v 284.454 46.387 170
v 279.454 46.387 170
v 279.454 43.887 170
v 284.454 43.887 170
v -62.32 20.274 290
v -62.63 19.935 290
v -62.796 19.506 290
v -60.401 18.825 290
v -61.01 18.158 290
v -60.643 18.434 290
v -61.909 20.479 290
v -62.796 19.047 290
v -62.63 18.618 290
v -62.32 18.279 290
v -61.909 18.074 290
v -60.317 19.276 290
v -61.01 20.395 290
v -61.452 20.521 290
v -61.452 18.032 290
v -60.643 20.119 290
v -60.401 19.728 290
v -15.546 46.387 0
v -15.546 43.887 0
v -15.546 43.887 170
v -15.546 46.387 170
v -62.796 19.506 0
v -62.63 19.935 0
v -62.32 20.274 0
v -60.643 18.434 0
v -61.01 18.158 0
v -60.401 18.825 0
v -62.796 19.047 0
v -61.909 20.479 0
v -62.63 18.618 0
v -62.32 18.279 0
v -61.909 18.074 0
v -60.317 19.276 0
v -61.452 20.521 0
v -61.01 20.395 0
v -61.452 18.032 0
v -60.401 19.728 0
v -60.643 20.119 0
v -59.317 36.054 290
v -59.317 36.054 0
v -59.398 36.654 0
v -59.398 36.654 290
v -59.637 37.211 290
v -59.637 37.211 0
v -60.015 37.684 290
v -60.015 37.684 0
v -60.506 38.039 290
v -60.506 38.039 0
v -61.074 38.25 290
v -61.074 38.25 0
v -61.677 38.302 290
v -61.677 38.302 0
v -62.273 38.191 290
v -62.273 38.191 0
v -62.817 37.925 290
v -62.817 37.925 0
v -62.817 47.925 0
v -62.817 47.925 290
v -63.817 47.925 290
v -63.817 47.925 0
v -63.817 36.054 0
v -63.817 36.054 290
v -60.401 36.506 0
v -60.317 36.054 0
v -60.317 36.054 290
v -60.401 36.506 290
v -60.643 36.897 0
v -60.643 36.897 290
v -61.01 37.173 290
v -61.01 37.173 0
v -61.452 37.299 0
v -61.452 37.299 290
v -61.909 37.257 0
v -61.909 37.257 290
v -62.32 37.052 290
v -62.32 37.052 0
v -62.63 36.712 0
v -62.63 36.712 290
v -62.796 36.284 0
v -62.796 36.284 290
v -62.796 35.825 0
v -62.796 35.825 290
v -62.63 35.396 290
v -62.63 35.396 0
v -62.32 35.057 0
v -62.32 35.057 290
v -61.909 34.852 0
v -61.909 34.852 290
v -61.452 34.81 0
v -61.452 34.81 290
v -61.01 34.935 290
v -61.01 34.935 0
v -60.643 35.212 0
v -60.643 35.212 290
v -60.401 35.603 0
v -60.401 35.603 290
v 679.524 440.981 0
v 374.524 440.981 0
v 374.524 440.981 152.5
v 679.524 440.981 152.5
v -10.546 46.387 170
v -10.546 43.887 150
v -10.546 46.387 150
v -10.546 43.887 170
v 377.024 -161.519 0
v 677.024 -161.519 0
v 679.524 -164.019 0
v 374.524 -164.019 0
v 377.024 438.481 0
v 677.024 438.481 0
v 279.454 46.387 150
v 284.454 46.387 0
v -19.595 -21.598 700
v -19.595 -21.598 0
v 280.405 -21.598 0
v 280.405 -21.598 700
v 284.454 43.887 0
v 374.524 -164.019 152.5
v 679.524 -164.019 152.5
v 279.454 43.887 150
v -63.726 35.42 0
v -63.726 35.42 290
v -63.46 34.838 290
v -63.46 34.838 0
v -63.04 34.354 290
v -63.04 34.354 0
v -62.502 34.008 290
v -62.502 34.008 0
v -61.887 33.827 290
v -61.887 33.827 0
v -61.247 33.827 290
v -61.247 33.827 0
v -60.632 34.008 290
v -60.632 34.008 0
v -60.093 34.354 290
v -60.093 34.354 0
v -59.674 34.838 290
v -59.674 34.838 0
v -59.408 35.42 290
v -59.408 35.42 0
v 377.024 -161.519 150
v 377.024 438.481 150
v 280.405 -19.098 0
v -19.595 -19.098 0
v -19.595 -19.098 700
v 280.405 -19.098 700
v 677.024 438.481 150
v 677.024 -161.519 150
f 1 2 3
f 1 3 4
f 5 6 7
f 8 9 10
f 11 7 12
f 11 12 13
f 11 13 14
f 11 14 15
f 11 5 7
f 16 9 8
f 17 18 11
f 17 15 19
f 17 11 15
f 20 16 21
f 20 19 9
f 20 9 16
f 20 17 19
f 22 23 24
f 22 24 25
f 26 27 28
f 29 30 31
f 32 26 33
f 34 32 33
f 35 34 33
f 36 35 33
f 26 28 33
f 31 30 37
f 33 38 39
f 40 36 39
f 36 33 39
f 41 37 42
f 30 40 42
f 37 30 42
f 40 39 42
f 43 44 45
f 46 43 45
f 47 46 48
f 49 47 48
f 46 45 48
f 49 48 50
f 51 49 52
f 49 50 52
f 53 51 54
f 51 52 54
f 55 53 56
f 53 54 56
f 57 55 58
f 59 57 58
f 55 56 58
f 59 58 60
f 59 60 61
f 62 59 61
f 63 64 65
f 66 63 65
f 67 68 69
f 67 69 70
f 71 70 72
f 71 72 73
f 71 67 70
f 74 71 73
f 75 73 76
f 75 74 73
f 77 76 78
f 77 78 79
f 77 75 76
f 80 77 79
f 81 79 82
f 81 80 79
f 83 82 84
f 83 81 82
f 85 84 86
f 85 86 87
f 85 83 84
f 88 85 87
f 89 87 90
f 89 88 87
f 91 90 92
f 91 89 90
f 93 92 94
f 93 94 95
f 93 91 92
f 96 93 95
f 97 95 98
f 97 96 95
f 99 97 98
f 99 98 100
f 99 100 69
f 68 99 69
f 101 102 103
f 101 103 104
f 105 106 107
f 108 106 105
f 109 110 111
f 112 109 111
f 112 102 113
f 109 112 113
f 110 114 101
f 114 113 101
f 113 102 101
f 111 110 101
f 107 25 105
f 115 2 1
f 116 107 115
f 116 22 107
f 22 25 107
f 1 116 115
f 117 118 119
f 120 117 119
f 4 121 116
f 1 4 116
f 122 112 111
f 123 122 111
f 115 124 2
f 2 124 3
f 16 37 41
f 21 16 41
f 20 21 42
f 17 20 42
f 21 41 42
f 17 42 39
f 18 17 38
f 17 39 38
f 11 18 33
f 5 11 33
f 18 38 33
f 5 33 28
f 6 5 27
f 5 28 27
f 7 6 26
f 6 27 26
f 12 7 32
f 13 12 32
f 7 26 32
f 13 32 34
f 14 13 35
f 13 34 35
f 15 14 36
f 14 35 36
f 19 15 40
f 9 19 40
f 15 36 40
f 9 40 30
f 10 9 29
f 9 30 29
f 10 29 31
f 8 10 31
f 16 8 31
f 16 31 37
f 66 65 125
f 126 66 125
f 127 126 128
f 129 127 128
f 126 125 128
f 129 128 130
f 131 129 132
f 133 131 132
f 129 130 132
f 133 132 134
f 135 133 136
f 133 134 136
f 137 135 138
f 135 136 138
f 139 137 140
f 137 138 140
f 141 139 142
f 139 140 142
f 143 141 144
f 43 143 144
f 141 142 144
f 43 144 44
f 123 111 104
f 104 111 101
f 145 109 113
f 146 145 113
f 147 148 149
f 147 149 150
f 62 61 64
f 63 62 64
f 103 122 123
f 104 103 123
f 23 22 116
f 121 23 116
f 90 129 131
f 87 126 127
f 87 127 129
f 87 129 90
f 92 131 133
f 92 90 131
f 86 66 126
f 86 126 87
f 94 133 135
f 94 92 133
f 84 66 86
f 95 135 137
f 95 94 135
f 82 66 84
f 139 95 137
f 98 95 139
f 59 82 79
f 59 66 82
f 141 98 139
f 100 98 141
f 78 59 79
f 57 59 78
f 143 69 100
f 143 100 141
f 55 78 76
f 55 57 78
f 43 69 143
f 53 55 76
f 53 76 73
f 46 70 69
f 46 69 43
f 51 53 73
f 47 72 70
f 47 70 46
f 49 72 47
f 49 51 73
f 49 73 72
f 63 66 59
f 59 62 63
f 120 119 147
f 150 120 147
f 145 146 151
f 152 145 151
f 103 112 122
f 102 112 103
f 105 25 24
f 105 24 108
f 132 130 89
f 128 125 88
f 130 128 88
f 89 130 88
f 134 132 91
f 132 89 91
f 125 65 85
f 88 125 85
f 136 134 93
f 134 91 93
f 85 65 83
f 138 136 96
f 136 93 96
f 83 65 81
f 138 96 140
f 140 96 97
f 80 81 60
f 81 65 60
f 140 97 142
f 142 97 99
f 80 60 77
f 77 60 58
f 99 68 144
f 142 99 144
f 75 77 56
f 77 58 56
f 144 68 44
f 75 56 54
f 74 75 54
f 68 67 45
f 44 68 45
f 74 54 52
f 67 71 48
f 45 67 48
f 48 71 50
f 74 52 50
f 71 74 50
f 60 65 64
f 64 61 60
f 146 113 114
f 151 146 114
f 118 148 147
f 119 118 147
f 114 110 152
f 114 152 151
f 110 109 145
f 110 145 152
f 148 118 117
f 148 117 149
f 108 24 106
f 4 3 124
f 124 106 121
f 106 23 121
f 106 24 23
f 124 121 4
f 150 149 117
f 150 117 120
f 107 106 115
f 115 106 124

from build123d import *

# Parameters (mm, degrees)
F0_W     = 300
F0_H     = 2.5
F1_DEPTH = 170
F2_W     = 290
F2_H     = 20
F3_DEPTH = 25
F0_R     = 1.25
F4_DEPTH = 290
F5_DEPTH = 290
F6_DEPTH = 700
F0_W_2   = 305
F0_H_2   = 605
F9_DEPTH = 152.5
F10_T    = -2.5


with BuildPart() as f1:
    # F0 (on Top) → F1 (new body)
    with BuildSketch(Plane.XY):
        with Locations((134.453777, 45.137415)):
            Rectangle(F0_W, F0_H)
    extrude(amount=F1_DEPTH)

    # F2 (on face) → F3 (cut)
    with BuildSketch(Plane.XZ.offset(-43.887415)):
        with Locations((134.453777, 160)):
            Rectangle(F2_W, F2_H)
    extrude(amount=-F3_DEPTH, mode=Mode.SUBTRACT)


with BuildPart() as f4:
    # F0 (on Top) → F4 (new body)
    with BuildSketch(Plane.XY):
        with Locations((-61.566853, 19.276489)):
            Circle(F0_R)
    extrude(amount=F4_DEPTH)


with BuildPart() as f5:
    # F0 (on Top) → F5 (new body)
    with BuildSketch(Plane.XY):
        with BuildLine():
            ThreePointArc((-63.816853, 36.054391), (-61.566853, 33.804391), (-59.316853, 36.054391))
            ThreePointArc((-59.316853, 36.054391), (-60.506193, 38.038705), (-62.816853, 37.92522))
            ThreePointArc((-62.816853, 37.92522), (-63.551167, 37.115052), (-63.816853, 36.054391))
        make_face()
        with Locations((-61.566853, 36.054391)):
            Circle(F0_R, mode=Mode.SUBTRACT)
        with BuildLine():
            ThreePointArc((-63.816853, 36.054391), (-63.551167, 37.115052), (-62.816853, 37.92522))
            Line((-62.816853, 37.92522), (-62.816853, 47.92522))
            Line((-62.816853, 47.92522), (-63.816853, 47.92522))
            Line((-63.816853, 47.92522), (-63.816853, 36.054391))
        make_face()
    extrude(amount=F5_DEPTH)


with BuildPart() as f6:
    # F0 (on Top) → F6 (new body)
    with BuildSketch(Plane.XY):
        with Locations((130.404871, -20.34846)):
            Rectangle(F0_W, F0_H)
    extrude(amount=F6_DEPTH)


with BuildPart() as f9:
    # F0 (on Top) → F9 (new body)
    with BuildSketch(Plane.XY):
        with Locations((527.024353, 138.480691)):
            Rectangle(F0_W_2, F0_H_2)
    extrude(amount=F9_DEPTH)

    # F10
    f10_openings = [f9.faces().sort_by_distance(p)[0] for p in [
        (527.024353, 138.480691, 0),
    ]]
    offset(amount=F10_T, openings=f10_openings)


solid = Compound([f1.part, f4.part, f5.part, f6.part, f9.part])
